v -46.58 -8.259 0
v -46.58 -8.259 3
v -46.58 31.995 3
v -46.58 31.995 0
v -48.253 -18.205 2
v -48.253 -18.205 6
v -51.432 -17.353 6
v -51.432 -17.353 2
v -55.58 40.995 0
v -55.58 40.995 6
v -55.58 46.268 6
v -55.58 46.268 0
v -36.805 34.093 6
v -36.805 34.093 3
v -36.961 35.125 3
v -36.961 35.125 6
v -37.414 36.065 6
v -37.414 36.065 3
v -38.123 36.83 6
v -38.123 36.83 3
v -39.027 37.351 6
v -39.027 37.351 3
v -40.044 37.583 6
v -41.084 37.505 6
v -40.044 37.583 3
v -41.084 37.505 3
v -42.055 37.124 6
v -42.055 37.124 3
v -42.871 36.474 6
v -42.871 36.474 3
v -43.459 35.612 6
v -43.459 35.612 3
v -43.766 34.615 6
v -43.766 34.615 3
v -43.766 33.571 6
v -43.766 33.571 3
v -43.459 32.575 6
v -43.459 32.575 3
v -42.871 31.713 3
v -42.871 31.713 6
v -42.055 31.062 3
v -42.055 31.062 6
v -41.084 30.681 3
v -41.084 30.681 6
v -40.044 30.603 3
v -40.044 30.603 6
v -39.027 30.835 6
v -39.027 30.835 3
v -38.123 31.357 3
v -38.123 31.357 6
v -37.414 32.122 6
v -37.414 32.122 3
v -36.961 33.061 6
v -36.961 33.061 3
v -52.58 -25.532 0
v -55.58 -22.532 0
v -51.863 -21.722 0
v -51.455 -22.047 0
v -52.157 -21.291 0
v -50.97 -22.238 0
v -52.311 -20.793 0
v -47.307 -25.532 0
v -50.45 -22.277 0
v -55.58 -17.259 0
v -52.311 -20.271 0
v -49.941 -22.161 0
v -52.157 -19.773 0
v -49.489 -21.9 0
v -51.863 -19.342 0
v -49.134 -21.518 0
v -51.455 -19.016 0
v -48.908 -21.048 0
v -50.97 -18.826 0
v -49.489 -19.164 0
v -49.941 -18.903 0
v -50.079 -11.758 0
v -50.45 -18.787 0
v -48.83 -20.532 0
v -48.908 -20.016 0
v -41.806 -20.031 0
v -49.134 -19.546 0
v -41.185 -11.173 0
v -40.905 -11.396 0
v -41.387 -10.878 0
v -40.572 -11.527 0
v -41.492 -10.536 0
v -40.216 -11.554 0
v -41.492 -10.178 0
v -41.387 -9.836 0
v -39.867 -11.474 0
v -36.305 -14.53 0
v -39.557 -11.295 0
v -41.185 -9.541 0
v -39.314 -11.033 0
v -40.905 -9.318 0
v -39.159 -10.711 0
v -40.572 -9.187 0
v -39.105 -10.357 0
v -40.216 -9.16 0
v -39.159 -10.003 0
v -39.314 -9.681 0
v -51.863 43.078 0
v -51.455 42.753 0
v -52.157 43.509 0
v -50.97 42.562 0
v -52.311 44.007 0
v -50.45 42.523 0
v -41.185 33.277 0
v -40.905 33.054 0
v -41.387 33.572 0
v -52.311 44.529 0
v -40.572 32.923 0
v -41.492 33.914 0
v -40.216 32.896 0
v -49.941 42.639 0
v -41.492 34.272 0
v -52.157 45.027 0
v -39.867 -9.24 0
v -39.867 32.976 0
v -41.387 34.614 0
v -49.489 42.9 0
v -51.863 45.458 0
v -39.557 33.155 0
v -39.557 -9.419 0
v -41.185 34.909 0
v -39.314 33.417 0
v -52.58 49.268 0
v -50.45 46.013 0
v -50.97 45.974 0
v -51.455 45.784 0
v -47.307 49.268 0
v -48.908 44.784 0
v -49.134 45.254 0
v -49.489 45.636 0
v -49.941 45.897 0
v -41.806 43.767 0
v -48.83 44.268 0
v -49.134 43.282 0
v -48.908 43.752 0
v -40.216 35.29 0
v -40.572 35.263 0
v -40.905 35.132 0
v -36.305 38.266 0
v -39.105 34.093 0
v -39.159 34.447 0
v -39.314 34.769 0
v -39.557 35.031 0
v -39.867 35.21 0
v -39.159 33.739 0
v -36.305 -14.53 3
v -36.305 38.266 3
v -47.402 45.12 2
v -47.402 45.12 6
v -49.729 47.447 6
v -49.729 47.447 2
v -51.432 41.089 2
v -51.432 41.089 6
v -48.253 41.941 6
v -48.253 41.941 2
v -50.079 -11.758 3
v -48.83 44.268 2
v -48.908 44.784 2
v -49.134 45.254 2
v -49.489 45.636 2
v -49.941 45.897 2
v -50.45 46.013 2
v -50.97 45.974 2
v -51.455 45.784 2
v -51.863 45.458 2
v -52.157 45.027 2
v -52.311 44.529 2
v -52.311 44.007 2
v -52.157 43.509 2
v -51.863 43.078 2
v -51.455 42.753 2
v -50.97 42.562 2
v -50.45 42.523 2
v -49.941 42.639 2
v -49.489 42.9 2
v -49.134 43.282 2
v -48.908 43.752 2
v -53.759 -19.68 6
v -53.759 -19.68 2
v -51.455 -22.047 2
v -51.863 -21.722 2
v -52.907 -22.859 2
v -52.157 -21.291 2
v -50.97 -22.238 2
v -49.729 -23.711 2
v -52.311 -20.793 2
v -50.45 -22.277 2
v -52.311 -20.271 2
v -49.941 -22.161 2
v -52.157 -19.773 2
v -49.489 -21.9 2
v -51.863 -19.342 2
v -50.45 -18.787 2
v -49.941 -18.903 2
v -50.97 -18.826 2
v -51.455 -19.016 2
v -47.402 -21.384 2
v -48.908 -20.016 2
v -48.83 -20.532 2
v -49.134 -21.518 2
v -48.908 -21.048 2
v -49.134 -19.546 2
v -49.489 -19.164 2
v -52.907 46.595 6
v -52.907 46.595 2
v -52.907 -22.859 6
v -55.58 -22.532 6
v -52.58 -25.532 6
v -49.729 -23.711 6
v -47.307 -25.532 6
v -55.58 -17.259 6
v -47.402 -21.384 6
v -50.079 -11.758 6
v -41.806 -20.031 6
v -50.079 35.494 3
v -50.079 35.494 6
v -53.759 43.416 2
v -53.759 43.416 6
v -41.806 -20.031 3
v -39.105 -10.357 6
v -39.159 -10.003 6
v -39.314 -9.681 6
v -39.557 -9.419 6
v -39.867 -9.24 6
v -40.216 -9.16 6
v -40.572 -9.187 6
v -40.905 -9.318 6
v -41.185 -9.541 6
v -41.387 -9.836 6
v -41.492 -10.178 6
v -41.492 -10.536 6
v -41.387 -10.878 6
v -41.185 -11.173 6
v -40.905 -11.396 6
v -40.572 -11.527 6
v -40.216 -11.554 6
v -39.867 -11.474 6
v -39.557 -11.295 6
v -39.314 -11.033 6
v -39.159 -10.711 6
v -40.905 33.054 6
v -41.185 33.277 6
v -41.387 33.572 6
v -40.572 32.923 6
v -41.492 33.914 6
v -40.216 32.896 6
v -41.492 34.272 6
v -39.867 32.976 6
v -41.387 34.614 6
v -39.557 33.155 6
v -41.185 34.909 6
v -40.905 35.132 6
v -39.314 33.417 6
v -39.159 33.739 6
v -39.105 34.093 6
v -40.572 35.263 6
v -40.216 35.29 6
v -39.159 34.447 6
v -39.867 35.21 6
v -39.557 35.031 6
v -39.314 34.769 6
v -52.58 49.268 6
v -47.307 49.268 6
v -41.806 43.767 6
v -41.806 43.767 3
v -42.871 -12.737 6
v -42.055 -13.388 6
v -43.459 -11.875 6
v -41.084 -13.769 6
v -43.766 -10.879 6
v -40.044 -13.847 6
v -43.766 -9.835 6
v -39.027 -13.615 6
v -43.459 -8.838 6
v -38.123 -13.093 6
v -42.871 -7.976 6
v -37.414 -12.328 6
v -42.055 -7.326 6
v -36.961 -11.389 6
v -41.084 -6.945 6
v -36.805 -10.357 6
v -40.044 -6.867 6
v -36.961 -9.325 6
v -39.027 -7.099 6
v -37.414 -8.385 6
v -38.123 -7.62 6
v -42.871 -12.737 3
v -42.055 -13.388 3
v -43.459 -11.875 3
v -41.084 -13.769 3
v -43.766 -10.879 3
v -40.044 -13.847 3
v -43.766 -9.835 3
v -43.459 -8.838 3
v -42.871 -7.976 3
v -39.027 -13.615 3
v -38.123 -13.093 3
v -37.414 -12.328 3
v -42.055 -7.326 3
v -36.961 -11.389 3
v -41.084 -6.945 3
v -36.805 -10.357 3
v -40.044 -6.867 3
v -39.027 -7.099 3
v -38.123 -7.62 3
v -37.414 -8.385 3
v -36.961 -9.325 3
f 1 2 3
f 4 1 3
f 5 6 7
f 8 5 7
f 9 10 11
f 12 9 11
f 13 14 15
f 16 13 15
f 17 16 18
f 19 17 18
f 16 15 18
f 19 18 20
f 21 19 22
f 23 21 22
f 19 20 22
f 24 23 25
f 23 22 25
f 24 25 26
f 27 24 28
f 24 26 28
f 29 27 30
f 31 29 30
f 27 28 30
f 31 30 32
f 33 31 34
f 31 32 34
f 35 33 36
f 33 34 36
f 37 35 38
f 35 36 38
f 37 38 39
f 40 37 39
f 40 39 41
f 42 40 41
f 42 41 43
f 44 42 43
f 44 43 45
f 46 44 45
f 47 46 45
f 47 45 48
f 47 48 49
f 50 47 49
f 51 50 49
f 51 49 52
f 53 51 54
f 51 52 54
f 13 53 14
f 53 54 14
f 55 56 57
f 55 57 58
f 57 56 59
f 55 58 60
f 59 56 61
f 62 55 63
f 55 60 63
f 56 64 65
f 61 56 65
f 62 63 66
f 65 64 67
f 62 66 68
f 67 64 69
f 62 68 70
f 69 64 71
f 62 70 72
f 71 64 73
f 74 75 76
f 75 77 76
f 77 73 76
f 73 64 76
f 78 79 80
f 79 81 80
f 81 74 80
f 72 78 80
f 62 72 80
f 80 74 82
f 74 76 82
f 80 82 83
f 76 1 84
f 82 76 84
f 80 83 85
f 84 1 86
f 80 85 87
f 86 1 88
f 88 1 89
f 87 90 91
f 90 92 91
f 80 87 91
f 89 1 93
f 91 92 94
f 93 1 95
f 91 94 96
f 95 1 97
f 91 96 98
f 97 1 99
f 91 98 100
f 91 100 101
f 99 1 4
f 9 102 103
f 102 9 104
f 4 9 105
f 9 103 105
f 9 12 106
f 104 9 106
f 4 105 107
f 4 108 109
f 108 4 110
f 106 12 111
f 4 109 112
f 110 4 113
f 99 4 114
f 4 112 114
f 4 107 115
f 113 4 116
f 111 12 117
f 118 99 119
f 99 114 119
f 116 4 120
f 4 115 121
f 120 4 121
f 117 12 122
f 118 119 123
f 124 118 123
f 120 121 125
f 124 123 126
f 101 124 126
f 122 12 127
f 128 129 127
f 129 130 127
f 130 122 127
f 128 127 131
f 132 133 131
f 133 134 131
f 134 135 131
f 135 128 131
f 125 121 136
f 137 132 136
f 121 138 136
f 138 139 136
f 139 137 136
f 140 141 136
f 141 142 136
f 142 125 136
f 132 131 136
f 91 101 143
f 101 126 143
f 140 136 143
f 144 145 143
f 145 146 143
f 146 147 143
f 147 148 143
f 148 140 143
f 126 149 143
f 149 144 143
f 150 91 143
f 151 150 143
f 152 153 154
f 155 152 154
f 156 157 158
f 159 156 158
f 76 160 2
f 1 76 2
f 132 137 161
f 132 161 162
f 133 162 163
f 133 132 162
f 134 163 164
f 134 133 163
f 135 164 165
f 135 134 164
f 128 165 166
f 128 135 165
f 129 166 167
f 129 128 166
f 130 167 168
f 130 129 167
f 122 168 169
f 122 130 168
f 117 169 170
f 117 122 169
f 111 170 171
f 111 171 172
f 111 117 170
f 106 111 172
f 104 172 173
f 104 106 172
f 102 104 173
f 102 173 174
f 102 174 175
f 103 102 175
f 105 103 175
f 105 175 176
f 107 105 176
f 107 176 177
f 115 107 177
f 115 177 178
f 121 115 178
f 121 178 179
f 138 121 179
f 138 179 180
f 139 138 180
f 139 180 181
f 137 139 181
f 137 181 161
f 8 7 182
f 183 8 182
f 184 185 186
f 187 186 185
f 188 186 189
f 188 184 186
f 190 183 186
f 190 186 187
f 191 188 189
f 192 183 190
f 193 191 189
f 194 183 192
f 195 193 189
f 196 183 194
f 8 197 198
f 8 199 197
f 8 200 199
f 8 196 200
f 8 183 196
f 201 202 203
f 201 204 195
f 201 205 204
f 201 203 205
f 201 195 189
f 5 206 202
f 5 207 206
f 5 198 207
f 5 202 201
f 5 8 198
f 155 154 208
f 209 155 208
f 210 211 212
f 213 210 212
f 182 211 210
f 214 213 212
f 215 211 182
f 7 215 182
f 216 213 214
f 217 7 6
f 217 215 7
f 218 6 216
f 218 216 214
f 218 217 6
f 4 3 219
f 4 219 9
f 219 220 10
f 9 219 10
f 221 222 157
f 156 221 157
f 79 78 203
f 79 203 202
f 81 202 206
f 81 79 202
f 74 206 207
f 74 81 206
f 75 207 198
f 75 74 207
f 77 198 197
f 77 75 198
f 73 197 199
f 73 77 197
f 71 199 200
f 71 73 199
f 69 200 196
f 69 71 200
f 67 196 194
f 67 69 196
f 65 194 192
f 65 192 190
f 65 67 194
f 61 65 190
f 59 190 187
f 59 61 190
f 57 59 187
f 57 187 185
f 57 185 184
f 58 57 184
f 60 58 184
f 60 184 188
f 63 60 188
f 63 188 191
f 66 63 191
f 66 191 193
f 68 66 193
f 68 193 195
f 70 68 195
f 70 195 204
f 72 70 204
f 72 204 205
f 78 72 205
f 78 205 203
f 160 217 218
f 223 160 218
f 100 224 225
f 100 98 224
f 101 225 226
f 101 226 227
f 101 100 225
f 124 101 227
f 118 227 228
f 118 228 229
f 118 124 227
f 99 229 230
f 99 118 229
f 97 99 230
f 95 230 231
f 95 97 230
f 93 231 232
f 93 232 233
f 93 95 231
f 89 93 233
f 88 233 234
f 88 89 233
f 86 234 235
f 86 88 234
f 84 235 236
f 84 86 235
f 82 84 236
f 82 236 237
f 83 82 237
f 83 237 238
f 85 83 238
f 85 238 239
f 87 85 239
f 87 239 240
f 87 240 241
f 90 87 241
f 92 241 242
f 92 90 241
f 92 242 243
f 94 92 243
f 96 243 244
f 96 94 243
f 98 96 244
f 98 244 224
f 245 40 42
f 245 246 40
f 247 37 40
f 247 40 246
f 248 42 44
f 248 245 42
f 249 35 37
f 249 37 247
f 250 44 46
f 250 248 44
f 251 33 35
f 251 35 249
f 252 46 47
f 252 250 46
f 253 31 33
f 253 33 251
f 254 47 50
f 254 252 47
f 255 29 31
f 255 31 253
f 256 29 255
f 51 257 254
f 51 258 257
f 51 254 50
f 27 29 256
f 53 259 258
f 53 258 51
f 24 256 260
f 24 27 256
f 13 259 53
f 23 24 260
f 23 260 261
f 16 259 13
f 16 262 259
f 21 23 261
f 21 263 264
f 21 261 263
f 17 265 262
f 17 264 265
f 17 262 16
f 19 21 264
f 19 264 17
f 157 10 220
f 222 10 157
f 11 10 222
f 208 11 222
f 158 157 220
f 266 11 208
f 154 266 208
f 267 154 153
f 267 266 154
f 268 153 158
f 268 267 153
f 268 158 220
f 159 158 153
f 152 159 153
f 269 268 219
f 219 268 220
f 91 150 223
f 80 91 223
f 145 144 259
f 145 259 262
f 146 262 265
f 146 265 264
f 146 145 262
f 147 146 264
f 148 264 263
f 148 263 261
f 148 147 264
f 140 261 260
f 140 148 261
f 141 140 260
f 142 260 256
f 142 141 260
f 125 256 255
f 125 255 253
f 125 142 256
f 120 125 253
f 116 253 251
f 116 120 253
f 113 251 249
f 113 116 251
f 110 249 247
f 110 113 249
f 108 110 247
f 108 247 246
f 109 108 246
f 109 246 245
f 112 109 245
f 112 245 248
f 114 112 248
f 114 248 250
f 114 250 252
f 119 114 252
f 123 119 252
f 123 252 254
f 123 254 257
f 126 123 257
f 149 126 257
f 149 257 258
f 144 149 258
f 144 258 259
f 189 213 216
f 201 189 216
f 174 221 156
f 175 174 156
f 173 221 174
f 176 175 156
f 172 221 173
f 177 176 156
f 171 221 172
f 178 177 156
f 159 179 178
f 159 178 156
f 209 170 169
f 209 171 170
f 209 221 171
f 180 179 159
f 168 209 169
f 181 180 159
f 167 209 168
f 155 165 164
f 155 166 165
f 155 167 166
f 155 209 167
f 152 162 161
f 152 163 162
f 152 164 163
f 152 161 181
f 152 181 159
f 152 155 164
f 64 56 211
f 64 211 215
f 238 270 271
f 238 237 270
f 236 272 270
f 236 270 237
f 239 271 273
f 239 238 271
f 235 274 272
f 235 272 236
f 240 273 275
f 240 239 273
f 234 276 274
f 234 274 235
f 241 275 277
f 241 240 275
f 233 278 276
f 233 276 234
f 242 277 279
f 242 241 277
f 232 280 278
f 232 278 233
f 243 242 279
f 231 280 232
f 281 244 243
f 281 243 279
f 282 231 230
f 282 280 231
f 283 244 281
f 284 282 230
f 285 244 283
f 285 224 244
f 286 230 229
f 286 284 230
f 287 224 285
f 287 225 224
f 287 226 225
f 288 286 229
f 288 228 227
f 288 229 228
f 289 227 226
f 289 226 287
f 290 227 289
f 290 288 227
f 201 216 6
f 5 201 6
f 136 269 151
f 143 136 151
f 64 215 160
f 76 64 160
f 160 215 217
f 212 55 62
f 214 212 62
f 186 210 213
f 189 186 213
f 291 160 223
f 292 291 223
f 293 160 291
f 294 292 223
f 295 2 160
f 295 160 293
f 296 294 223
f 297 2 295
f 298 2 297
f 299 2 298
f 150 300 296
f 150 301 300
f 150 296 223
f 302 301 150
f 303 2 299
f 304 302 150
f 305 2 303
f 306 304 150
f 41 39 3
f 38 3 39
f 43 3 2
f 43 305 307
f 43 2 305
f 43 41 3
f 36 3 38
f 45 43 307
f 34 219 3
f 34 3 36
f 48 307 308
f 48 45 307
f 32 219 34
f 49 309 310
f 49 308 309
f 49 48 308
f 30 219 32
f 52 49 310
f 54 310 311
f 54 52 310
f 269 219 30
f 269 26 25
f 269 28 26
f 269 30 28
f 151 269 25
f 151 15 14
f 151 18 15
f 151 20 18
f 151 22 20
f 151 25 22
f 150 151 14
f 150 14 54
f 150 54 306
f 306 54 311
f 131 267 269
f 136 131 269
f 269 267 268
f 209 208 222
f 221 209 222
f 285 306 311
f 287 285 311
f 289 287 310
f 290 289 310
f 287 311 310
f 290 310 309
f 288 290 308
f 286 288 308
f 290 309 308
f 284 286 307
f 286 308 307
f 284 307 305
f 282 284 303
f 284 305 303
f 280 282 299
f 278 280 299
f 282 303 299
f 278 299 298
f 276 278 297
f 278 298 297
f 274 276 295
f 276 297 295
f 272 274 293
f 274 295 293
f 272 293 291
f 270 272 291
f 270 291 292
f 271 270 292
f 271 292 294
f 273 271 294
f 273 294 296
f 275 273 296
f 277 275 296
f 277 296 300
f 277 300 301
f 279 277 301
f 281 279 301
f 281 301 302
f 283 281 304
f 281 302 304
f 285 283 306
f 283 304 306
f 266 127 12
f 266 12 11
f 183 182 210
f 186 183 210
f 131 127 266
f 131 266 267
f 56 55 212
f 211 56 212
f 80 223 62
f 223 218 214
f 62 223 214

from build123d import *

# Parameters (mm, degrees)
F0_W     = 19.275
F0_H     = 74.8
F0_R     = 1.75
F0_R_2   = 1.2
F1_DEPTH = 6
F3_DEPTH = 25
F2_R     = 1.2
F4_DEPTH = 3
F5_SIZE  = 3
F2_R_2   = 1.75
F6_DEPTH = 4
F7_R     = 3.5
F7_R_2   = 1.2
F8_DEPTH = 3


# Not quite as in the source:
# - a feature names something its author has since deleted; it is built from what else it names


with BuildPart() as f1:
    # F0 (on Top) → F1 (new body)
    with BuildSketch(Plane.XY):
        with Locations((-45.9428956378, 11.8681262247)):
            Rectangle(F0_W, F0_H)
        with Locations((-50.5803956378, -20.5318737753)):
            Circle(F0_R, mode=Mode.SUBTRACT)
        with Locations((-40.3053956378, -10.3568737753)):
            Circle(F0_R_2, mode=Mode.SUBTRACT)
        with Locations((-40.3053956378, 34.0931262247)):
            Circle(F0_R_2, mode=Mode.SUBTRACT)
        with Locations((-50.5803956378, 44.2681262247)):
            Circle(F0_R, mode=Mode.SUBTRACT)
    extrude(amount=F1_DEPTH)

    # F2 (on face) → F3 (cut)
    with BuildSketch(Plane.XY.offset(6)):
        Polygon((-47.307246298, 49.2681262247), (-41.8063209679, 43.7672008947), (-36.3053956378, 38.2662755646), (-36.3053956378, 49.2681262247), align=None)
        Polygon((-55.5803956378, 40.9949768848), (-55.5803956378, -17.2587244354), (-50.0794703078, -11.7577991053), (-46.5803956378, -8.2587244354), (-46.5803956378, 31.9949768848), (-50.0794703078, 35.4940515548), align=None)
        Polygon((-36.3053956378, -14.5300231152), (-41.8063209679, -20.0309484452), (-47.307246298, -25.5318737753), (-36.3053956378, -25.5318737753), align=None)
    extrude(amount=-F3_DEPTH, mode=Mode.SUBTRACT)

    # F2 (on face) → F4 (cut)
    with BuildSketch(Plane.XY.offset(6)):
        Polygon((-46.5803956378, -8.2587244354), (-50.0794703078, -11.7577991053), (-41.8063209679, -20.0309484452), (-36.3053956378, -14.5300231152), (-36.3053956378, 38.2662755646), (-41.8063209679, 43.7672008947), (-50.0794703078, 35.4940515548), (-46.5803956378, 31.9949768848), align=None)
        with Locations((-40.3053956378, -10.3568737753)):
            Circle(F2_R, mode=Mode.SUBTRACT)
        with Locations((-40.3053956378, 34.0931262247)):
            Circle(F2_R, mode=Mode.SUBTRACT)
    extrude(amount=-F4_DEPTH, mode=Mode.SUBTRACT)

    # F5
    f5_edges = [f1.edges().sort_by_distance(p)[0] for p in [
        (-55.580396, 49.268126, 3),
        (-55.580396, -25.531874, 3),
    ]]
    chamfer(f5_edges, length=F5_SIZE)

    # F2 (on face) → F6 (cut)
    with BuildSketch(Plane.XY.offset(6)):
        Polygon((-49.7286489393, 47.4468881789), (-52.9074108935, 46.5951414804), (-53.759157592, 43.4163795262), (-51.4321423364, 41.0893642705), (-48.2533803822, 41.9411109691), (-47.4016336836, 45.1198729233), align=None)
        with Locations((-50.5803956378, 44.2681262247)):
            Circle(F2_R_2, mode=Mode.SUBTRACT)
        Polygon((-52.9074108935, -22.8588890309), (-49.7286489393, -23.7106357295), (-47.4016336836, -21.3836204738), (-48.2533803822, -18.2048585196), (-51.4321423364, -17.3531118211), (-53.759157592, -19.6801270767), align=None)
        with Locations((-50.5803956378, -20.5318737753)):
            Circle(F2_R_2, mode=Mode.SUBTRACT)
    extrude(amount=-F6_DEPTH, mode=Mode.SUBTRACT)

    # F7 (on face) → F8 (join)
    with BuildSketch(Plane.XY.offset(3)):
        with Locations((-40.3053956378, -10.3568737753)):
            Circle(F7_R)
        with Locations((-40.3053956378, -10.3568737753)):
            Circle(F7_R_2, mode=Mode.SUBTRACT)
        with Locations((-40.3053956378, 34.0931262247)):
            Circle(F7_R)
        with Locations((-40.3053956378, 34.0931262247)):
            Circle(F7_R_2, mode=Mode.SUBTRACT)
    extrude(amount=F8_DEPTH)


solid = f1.part
